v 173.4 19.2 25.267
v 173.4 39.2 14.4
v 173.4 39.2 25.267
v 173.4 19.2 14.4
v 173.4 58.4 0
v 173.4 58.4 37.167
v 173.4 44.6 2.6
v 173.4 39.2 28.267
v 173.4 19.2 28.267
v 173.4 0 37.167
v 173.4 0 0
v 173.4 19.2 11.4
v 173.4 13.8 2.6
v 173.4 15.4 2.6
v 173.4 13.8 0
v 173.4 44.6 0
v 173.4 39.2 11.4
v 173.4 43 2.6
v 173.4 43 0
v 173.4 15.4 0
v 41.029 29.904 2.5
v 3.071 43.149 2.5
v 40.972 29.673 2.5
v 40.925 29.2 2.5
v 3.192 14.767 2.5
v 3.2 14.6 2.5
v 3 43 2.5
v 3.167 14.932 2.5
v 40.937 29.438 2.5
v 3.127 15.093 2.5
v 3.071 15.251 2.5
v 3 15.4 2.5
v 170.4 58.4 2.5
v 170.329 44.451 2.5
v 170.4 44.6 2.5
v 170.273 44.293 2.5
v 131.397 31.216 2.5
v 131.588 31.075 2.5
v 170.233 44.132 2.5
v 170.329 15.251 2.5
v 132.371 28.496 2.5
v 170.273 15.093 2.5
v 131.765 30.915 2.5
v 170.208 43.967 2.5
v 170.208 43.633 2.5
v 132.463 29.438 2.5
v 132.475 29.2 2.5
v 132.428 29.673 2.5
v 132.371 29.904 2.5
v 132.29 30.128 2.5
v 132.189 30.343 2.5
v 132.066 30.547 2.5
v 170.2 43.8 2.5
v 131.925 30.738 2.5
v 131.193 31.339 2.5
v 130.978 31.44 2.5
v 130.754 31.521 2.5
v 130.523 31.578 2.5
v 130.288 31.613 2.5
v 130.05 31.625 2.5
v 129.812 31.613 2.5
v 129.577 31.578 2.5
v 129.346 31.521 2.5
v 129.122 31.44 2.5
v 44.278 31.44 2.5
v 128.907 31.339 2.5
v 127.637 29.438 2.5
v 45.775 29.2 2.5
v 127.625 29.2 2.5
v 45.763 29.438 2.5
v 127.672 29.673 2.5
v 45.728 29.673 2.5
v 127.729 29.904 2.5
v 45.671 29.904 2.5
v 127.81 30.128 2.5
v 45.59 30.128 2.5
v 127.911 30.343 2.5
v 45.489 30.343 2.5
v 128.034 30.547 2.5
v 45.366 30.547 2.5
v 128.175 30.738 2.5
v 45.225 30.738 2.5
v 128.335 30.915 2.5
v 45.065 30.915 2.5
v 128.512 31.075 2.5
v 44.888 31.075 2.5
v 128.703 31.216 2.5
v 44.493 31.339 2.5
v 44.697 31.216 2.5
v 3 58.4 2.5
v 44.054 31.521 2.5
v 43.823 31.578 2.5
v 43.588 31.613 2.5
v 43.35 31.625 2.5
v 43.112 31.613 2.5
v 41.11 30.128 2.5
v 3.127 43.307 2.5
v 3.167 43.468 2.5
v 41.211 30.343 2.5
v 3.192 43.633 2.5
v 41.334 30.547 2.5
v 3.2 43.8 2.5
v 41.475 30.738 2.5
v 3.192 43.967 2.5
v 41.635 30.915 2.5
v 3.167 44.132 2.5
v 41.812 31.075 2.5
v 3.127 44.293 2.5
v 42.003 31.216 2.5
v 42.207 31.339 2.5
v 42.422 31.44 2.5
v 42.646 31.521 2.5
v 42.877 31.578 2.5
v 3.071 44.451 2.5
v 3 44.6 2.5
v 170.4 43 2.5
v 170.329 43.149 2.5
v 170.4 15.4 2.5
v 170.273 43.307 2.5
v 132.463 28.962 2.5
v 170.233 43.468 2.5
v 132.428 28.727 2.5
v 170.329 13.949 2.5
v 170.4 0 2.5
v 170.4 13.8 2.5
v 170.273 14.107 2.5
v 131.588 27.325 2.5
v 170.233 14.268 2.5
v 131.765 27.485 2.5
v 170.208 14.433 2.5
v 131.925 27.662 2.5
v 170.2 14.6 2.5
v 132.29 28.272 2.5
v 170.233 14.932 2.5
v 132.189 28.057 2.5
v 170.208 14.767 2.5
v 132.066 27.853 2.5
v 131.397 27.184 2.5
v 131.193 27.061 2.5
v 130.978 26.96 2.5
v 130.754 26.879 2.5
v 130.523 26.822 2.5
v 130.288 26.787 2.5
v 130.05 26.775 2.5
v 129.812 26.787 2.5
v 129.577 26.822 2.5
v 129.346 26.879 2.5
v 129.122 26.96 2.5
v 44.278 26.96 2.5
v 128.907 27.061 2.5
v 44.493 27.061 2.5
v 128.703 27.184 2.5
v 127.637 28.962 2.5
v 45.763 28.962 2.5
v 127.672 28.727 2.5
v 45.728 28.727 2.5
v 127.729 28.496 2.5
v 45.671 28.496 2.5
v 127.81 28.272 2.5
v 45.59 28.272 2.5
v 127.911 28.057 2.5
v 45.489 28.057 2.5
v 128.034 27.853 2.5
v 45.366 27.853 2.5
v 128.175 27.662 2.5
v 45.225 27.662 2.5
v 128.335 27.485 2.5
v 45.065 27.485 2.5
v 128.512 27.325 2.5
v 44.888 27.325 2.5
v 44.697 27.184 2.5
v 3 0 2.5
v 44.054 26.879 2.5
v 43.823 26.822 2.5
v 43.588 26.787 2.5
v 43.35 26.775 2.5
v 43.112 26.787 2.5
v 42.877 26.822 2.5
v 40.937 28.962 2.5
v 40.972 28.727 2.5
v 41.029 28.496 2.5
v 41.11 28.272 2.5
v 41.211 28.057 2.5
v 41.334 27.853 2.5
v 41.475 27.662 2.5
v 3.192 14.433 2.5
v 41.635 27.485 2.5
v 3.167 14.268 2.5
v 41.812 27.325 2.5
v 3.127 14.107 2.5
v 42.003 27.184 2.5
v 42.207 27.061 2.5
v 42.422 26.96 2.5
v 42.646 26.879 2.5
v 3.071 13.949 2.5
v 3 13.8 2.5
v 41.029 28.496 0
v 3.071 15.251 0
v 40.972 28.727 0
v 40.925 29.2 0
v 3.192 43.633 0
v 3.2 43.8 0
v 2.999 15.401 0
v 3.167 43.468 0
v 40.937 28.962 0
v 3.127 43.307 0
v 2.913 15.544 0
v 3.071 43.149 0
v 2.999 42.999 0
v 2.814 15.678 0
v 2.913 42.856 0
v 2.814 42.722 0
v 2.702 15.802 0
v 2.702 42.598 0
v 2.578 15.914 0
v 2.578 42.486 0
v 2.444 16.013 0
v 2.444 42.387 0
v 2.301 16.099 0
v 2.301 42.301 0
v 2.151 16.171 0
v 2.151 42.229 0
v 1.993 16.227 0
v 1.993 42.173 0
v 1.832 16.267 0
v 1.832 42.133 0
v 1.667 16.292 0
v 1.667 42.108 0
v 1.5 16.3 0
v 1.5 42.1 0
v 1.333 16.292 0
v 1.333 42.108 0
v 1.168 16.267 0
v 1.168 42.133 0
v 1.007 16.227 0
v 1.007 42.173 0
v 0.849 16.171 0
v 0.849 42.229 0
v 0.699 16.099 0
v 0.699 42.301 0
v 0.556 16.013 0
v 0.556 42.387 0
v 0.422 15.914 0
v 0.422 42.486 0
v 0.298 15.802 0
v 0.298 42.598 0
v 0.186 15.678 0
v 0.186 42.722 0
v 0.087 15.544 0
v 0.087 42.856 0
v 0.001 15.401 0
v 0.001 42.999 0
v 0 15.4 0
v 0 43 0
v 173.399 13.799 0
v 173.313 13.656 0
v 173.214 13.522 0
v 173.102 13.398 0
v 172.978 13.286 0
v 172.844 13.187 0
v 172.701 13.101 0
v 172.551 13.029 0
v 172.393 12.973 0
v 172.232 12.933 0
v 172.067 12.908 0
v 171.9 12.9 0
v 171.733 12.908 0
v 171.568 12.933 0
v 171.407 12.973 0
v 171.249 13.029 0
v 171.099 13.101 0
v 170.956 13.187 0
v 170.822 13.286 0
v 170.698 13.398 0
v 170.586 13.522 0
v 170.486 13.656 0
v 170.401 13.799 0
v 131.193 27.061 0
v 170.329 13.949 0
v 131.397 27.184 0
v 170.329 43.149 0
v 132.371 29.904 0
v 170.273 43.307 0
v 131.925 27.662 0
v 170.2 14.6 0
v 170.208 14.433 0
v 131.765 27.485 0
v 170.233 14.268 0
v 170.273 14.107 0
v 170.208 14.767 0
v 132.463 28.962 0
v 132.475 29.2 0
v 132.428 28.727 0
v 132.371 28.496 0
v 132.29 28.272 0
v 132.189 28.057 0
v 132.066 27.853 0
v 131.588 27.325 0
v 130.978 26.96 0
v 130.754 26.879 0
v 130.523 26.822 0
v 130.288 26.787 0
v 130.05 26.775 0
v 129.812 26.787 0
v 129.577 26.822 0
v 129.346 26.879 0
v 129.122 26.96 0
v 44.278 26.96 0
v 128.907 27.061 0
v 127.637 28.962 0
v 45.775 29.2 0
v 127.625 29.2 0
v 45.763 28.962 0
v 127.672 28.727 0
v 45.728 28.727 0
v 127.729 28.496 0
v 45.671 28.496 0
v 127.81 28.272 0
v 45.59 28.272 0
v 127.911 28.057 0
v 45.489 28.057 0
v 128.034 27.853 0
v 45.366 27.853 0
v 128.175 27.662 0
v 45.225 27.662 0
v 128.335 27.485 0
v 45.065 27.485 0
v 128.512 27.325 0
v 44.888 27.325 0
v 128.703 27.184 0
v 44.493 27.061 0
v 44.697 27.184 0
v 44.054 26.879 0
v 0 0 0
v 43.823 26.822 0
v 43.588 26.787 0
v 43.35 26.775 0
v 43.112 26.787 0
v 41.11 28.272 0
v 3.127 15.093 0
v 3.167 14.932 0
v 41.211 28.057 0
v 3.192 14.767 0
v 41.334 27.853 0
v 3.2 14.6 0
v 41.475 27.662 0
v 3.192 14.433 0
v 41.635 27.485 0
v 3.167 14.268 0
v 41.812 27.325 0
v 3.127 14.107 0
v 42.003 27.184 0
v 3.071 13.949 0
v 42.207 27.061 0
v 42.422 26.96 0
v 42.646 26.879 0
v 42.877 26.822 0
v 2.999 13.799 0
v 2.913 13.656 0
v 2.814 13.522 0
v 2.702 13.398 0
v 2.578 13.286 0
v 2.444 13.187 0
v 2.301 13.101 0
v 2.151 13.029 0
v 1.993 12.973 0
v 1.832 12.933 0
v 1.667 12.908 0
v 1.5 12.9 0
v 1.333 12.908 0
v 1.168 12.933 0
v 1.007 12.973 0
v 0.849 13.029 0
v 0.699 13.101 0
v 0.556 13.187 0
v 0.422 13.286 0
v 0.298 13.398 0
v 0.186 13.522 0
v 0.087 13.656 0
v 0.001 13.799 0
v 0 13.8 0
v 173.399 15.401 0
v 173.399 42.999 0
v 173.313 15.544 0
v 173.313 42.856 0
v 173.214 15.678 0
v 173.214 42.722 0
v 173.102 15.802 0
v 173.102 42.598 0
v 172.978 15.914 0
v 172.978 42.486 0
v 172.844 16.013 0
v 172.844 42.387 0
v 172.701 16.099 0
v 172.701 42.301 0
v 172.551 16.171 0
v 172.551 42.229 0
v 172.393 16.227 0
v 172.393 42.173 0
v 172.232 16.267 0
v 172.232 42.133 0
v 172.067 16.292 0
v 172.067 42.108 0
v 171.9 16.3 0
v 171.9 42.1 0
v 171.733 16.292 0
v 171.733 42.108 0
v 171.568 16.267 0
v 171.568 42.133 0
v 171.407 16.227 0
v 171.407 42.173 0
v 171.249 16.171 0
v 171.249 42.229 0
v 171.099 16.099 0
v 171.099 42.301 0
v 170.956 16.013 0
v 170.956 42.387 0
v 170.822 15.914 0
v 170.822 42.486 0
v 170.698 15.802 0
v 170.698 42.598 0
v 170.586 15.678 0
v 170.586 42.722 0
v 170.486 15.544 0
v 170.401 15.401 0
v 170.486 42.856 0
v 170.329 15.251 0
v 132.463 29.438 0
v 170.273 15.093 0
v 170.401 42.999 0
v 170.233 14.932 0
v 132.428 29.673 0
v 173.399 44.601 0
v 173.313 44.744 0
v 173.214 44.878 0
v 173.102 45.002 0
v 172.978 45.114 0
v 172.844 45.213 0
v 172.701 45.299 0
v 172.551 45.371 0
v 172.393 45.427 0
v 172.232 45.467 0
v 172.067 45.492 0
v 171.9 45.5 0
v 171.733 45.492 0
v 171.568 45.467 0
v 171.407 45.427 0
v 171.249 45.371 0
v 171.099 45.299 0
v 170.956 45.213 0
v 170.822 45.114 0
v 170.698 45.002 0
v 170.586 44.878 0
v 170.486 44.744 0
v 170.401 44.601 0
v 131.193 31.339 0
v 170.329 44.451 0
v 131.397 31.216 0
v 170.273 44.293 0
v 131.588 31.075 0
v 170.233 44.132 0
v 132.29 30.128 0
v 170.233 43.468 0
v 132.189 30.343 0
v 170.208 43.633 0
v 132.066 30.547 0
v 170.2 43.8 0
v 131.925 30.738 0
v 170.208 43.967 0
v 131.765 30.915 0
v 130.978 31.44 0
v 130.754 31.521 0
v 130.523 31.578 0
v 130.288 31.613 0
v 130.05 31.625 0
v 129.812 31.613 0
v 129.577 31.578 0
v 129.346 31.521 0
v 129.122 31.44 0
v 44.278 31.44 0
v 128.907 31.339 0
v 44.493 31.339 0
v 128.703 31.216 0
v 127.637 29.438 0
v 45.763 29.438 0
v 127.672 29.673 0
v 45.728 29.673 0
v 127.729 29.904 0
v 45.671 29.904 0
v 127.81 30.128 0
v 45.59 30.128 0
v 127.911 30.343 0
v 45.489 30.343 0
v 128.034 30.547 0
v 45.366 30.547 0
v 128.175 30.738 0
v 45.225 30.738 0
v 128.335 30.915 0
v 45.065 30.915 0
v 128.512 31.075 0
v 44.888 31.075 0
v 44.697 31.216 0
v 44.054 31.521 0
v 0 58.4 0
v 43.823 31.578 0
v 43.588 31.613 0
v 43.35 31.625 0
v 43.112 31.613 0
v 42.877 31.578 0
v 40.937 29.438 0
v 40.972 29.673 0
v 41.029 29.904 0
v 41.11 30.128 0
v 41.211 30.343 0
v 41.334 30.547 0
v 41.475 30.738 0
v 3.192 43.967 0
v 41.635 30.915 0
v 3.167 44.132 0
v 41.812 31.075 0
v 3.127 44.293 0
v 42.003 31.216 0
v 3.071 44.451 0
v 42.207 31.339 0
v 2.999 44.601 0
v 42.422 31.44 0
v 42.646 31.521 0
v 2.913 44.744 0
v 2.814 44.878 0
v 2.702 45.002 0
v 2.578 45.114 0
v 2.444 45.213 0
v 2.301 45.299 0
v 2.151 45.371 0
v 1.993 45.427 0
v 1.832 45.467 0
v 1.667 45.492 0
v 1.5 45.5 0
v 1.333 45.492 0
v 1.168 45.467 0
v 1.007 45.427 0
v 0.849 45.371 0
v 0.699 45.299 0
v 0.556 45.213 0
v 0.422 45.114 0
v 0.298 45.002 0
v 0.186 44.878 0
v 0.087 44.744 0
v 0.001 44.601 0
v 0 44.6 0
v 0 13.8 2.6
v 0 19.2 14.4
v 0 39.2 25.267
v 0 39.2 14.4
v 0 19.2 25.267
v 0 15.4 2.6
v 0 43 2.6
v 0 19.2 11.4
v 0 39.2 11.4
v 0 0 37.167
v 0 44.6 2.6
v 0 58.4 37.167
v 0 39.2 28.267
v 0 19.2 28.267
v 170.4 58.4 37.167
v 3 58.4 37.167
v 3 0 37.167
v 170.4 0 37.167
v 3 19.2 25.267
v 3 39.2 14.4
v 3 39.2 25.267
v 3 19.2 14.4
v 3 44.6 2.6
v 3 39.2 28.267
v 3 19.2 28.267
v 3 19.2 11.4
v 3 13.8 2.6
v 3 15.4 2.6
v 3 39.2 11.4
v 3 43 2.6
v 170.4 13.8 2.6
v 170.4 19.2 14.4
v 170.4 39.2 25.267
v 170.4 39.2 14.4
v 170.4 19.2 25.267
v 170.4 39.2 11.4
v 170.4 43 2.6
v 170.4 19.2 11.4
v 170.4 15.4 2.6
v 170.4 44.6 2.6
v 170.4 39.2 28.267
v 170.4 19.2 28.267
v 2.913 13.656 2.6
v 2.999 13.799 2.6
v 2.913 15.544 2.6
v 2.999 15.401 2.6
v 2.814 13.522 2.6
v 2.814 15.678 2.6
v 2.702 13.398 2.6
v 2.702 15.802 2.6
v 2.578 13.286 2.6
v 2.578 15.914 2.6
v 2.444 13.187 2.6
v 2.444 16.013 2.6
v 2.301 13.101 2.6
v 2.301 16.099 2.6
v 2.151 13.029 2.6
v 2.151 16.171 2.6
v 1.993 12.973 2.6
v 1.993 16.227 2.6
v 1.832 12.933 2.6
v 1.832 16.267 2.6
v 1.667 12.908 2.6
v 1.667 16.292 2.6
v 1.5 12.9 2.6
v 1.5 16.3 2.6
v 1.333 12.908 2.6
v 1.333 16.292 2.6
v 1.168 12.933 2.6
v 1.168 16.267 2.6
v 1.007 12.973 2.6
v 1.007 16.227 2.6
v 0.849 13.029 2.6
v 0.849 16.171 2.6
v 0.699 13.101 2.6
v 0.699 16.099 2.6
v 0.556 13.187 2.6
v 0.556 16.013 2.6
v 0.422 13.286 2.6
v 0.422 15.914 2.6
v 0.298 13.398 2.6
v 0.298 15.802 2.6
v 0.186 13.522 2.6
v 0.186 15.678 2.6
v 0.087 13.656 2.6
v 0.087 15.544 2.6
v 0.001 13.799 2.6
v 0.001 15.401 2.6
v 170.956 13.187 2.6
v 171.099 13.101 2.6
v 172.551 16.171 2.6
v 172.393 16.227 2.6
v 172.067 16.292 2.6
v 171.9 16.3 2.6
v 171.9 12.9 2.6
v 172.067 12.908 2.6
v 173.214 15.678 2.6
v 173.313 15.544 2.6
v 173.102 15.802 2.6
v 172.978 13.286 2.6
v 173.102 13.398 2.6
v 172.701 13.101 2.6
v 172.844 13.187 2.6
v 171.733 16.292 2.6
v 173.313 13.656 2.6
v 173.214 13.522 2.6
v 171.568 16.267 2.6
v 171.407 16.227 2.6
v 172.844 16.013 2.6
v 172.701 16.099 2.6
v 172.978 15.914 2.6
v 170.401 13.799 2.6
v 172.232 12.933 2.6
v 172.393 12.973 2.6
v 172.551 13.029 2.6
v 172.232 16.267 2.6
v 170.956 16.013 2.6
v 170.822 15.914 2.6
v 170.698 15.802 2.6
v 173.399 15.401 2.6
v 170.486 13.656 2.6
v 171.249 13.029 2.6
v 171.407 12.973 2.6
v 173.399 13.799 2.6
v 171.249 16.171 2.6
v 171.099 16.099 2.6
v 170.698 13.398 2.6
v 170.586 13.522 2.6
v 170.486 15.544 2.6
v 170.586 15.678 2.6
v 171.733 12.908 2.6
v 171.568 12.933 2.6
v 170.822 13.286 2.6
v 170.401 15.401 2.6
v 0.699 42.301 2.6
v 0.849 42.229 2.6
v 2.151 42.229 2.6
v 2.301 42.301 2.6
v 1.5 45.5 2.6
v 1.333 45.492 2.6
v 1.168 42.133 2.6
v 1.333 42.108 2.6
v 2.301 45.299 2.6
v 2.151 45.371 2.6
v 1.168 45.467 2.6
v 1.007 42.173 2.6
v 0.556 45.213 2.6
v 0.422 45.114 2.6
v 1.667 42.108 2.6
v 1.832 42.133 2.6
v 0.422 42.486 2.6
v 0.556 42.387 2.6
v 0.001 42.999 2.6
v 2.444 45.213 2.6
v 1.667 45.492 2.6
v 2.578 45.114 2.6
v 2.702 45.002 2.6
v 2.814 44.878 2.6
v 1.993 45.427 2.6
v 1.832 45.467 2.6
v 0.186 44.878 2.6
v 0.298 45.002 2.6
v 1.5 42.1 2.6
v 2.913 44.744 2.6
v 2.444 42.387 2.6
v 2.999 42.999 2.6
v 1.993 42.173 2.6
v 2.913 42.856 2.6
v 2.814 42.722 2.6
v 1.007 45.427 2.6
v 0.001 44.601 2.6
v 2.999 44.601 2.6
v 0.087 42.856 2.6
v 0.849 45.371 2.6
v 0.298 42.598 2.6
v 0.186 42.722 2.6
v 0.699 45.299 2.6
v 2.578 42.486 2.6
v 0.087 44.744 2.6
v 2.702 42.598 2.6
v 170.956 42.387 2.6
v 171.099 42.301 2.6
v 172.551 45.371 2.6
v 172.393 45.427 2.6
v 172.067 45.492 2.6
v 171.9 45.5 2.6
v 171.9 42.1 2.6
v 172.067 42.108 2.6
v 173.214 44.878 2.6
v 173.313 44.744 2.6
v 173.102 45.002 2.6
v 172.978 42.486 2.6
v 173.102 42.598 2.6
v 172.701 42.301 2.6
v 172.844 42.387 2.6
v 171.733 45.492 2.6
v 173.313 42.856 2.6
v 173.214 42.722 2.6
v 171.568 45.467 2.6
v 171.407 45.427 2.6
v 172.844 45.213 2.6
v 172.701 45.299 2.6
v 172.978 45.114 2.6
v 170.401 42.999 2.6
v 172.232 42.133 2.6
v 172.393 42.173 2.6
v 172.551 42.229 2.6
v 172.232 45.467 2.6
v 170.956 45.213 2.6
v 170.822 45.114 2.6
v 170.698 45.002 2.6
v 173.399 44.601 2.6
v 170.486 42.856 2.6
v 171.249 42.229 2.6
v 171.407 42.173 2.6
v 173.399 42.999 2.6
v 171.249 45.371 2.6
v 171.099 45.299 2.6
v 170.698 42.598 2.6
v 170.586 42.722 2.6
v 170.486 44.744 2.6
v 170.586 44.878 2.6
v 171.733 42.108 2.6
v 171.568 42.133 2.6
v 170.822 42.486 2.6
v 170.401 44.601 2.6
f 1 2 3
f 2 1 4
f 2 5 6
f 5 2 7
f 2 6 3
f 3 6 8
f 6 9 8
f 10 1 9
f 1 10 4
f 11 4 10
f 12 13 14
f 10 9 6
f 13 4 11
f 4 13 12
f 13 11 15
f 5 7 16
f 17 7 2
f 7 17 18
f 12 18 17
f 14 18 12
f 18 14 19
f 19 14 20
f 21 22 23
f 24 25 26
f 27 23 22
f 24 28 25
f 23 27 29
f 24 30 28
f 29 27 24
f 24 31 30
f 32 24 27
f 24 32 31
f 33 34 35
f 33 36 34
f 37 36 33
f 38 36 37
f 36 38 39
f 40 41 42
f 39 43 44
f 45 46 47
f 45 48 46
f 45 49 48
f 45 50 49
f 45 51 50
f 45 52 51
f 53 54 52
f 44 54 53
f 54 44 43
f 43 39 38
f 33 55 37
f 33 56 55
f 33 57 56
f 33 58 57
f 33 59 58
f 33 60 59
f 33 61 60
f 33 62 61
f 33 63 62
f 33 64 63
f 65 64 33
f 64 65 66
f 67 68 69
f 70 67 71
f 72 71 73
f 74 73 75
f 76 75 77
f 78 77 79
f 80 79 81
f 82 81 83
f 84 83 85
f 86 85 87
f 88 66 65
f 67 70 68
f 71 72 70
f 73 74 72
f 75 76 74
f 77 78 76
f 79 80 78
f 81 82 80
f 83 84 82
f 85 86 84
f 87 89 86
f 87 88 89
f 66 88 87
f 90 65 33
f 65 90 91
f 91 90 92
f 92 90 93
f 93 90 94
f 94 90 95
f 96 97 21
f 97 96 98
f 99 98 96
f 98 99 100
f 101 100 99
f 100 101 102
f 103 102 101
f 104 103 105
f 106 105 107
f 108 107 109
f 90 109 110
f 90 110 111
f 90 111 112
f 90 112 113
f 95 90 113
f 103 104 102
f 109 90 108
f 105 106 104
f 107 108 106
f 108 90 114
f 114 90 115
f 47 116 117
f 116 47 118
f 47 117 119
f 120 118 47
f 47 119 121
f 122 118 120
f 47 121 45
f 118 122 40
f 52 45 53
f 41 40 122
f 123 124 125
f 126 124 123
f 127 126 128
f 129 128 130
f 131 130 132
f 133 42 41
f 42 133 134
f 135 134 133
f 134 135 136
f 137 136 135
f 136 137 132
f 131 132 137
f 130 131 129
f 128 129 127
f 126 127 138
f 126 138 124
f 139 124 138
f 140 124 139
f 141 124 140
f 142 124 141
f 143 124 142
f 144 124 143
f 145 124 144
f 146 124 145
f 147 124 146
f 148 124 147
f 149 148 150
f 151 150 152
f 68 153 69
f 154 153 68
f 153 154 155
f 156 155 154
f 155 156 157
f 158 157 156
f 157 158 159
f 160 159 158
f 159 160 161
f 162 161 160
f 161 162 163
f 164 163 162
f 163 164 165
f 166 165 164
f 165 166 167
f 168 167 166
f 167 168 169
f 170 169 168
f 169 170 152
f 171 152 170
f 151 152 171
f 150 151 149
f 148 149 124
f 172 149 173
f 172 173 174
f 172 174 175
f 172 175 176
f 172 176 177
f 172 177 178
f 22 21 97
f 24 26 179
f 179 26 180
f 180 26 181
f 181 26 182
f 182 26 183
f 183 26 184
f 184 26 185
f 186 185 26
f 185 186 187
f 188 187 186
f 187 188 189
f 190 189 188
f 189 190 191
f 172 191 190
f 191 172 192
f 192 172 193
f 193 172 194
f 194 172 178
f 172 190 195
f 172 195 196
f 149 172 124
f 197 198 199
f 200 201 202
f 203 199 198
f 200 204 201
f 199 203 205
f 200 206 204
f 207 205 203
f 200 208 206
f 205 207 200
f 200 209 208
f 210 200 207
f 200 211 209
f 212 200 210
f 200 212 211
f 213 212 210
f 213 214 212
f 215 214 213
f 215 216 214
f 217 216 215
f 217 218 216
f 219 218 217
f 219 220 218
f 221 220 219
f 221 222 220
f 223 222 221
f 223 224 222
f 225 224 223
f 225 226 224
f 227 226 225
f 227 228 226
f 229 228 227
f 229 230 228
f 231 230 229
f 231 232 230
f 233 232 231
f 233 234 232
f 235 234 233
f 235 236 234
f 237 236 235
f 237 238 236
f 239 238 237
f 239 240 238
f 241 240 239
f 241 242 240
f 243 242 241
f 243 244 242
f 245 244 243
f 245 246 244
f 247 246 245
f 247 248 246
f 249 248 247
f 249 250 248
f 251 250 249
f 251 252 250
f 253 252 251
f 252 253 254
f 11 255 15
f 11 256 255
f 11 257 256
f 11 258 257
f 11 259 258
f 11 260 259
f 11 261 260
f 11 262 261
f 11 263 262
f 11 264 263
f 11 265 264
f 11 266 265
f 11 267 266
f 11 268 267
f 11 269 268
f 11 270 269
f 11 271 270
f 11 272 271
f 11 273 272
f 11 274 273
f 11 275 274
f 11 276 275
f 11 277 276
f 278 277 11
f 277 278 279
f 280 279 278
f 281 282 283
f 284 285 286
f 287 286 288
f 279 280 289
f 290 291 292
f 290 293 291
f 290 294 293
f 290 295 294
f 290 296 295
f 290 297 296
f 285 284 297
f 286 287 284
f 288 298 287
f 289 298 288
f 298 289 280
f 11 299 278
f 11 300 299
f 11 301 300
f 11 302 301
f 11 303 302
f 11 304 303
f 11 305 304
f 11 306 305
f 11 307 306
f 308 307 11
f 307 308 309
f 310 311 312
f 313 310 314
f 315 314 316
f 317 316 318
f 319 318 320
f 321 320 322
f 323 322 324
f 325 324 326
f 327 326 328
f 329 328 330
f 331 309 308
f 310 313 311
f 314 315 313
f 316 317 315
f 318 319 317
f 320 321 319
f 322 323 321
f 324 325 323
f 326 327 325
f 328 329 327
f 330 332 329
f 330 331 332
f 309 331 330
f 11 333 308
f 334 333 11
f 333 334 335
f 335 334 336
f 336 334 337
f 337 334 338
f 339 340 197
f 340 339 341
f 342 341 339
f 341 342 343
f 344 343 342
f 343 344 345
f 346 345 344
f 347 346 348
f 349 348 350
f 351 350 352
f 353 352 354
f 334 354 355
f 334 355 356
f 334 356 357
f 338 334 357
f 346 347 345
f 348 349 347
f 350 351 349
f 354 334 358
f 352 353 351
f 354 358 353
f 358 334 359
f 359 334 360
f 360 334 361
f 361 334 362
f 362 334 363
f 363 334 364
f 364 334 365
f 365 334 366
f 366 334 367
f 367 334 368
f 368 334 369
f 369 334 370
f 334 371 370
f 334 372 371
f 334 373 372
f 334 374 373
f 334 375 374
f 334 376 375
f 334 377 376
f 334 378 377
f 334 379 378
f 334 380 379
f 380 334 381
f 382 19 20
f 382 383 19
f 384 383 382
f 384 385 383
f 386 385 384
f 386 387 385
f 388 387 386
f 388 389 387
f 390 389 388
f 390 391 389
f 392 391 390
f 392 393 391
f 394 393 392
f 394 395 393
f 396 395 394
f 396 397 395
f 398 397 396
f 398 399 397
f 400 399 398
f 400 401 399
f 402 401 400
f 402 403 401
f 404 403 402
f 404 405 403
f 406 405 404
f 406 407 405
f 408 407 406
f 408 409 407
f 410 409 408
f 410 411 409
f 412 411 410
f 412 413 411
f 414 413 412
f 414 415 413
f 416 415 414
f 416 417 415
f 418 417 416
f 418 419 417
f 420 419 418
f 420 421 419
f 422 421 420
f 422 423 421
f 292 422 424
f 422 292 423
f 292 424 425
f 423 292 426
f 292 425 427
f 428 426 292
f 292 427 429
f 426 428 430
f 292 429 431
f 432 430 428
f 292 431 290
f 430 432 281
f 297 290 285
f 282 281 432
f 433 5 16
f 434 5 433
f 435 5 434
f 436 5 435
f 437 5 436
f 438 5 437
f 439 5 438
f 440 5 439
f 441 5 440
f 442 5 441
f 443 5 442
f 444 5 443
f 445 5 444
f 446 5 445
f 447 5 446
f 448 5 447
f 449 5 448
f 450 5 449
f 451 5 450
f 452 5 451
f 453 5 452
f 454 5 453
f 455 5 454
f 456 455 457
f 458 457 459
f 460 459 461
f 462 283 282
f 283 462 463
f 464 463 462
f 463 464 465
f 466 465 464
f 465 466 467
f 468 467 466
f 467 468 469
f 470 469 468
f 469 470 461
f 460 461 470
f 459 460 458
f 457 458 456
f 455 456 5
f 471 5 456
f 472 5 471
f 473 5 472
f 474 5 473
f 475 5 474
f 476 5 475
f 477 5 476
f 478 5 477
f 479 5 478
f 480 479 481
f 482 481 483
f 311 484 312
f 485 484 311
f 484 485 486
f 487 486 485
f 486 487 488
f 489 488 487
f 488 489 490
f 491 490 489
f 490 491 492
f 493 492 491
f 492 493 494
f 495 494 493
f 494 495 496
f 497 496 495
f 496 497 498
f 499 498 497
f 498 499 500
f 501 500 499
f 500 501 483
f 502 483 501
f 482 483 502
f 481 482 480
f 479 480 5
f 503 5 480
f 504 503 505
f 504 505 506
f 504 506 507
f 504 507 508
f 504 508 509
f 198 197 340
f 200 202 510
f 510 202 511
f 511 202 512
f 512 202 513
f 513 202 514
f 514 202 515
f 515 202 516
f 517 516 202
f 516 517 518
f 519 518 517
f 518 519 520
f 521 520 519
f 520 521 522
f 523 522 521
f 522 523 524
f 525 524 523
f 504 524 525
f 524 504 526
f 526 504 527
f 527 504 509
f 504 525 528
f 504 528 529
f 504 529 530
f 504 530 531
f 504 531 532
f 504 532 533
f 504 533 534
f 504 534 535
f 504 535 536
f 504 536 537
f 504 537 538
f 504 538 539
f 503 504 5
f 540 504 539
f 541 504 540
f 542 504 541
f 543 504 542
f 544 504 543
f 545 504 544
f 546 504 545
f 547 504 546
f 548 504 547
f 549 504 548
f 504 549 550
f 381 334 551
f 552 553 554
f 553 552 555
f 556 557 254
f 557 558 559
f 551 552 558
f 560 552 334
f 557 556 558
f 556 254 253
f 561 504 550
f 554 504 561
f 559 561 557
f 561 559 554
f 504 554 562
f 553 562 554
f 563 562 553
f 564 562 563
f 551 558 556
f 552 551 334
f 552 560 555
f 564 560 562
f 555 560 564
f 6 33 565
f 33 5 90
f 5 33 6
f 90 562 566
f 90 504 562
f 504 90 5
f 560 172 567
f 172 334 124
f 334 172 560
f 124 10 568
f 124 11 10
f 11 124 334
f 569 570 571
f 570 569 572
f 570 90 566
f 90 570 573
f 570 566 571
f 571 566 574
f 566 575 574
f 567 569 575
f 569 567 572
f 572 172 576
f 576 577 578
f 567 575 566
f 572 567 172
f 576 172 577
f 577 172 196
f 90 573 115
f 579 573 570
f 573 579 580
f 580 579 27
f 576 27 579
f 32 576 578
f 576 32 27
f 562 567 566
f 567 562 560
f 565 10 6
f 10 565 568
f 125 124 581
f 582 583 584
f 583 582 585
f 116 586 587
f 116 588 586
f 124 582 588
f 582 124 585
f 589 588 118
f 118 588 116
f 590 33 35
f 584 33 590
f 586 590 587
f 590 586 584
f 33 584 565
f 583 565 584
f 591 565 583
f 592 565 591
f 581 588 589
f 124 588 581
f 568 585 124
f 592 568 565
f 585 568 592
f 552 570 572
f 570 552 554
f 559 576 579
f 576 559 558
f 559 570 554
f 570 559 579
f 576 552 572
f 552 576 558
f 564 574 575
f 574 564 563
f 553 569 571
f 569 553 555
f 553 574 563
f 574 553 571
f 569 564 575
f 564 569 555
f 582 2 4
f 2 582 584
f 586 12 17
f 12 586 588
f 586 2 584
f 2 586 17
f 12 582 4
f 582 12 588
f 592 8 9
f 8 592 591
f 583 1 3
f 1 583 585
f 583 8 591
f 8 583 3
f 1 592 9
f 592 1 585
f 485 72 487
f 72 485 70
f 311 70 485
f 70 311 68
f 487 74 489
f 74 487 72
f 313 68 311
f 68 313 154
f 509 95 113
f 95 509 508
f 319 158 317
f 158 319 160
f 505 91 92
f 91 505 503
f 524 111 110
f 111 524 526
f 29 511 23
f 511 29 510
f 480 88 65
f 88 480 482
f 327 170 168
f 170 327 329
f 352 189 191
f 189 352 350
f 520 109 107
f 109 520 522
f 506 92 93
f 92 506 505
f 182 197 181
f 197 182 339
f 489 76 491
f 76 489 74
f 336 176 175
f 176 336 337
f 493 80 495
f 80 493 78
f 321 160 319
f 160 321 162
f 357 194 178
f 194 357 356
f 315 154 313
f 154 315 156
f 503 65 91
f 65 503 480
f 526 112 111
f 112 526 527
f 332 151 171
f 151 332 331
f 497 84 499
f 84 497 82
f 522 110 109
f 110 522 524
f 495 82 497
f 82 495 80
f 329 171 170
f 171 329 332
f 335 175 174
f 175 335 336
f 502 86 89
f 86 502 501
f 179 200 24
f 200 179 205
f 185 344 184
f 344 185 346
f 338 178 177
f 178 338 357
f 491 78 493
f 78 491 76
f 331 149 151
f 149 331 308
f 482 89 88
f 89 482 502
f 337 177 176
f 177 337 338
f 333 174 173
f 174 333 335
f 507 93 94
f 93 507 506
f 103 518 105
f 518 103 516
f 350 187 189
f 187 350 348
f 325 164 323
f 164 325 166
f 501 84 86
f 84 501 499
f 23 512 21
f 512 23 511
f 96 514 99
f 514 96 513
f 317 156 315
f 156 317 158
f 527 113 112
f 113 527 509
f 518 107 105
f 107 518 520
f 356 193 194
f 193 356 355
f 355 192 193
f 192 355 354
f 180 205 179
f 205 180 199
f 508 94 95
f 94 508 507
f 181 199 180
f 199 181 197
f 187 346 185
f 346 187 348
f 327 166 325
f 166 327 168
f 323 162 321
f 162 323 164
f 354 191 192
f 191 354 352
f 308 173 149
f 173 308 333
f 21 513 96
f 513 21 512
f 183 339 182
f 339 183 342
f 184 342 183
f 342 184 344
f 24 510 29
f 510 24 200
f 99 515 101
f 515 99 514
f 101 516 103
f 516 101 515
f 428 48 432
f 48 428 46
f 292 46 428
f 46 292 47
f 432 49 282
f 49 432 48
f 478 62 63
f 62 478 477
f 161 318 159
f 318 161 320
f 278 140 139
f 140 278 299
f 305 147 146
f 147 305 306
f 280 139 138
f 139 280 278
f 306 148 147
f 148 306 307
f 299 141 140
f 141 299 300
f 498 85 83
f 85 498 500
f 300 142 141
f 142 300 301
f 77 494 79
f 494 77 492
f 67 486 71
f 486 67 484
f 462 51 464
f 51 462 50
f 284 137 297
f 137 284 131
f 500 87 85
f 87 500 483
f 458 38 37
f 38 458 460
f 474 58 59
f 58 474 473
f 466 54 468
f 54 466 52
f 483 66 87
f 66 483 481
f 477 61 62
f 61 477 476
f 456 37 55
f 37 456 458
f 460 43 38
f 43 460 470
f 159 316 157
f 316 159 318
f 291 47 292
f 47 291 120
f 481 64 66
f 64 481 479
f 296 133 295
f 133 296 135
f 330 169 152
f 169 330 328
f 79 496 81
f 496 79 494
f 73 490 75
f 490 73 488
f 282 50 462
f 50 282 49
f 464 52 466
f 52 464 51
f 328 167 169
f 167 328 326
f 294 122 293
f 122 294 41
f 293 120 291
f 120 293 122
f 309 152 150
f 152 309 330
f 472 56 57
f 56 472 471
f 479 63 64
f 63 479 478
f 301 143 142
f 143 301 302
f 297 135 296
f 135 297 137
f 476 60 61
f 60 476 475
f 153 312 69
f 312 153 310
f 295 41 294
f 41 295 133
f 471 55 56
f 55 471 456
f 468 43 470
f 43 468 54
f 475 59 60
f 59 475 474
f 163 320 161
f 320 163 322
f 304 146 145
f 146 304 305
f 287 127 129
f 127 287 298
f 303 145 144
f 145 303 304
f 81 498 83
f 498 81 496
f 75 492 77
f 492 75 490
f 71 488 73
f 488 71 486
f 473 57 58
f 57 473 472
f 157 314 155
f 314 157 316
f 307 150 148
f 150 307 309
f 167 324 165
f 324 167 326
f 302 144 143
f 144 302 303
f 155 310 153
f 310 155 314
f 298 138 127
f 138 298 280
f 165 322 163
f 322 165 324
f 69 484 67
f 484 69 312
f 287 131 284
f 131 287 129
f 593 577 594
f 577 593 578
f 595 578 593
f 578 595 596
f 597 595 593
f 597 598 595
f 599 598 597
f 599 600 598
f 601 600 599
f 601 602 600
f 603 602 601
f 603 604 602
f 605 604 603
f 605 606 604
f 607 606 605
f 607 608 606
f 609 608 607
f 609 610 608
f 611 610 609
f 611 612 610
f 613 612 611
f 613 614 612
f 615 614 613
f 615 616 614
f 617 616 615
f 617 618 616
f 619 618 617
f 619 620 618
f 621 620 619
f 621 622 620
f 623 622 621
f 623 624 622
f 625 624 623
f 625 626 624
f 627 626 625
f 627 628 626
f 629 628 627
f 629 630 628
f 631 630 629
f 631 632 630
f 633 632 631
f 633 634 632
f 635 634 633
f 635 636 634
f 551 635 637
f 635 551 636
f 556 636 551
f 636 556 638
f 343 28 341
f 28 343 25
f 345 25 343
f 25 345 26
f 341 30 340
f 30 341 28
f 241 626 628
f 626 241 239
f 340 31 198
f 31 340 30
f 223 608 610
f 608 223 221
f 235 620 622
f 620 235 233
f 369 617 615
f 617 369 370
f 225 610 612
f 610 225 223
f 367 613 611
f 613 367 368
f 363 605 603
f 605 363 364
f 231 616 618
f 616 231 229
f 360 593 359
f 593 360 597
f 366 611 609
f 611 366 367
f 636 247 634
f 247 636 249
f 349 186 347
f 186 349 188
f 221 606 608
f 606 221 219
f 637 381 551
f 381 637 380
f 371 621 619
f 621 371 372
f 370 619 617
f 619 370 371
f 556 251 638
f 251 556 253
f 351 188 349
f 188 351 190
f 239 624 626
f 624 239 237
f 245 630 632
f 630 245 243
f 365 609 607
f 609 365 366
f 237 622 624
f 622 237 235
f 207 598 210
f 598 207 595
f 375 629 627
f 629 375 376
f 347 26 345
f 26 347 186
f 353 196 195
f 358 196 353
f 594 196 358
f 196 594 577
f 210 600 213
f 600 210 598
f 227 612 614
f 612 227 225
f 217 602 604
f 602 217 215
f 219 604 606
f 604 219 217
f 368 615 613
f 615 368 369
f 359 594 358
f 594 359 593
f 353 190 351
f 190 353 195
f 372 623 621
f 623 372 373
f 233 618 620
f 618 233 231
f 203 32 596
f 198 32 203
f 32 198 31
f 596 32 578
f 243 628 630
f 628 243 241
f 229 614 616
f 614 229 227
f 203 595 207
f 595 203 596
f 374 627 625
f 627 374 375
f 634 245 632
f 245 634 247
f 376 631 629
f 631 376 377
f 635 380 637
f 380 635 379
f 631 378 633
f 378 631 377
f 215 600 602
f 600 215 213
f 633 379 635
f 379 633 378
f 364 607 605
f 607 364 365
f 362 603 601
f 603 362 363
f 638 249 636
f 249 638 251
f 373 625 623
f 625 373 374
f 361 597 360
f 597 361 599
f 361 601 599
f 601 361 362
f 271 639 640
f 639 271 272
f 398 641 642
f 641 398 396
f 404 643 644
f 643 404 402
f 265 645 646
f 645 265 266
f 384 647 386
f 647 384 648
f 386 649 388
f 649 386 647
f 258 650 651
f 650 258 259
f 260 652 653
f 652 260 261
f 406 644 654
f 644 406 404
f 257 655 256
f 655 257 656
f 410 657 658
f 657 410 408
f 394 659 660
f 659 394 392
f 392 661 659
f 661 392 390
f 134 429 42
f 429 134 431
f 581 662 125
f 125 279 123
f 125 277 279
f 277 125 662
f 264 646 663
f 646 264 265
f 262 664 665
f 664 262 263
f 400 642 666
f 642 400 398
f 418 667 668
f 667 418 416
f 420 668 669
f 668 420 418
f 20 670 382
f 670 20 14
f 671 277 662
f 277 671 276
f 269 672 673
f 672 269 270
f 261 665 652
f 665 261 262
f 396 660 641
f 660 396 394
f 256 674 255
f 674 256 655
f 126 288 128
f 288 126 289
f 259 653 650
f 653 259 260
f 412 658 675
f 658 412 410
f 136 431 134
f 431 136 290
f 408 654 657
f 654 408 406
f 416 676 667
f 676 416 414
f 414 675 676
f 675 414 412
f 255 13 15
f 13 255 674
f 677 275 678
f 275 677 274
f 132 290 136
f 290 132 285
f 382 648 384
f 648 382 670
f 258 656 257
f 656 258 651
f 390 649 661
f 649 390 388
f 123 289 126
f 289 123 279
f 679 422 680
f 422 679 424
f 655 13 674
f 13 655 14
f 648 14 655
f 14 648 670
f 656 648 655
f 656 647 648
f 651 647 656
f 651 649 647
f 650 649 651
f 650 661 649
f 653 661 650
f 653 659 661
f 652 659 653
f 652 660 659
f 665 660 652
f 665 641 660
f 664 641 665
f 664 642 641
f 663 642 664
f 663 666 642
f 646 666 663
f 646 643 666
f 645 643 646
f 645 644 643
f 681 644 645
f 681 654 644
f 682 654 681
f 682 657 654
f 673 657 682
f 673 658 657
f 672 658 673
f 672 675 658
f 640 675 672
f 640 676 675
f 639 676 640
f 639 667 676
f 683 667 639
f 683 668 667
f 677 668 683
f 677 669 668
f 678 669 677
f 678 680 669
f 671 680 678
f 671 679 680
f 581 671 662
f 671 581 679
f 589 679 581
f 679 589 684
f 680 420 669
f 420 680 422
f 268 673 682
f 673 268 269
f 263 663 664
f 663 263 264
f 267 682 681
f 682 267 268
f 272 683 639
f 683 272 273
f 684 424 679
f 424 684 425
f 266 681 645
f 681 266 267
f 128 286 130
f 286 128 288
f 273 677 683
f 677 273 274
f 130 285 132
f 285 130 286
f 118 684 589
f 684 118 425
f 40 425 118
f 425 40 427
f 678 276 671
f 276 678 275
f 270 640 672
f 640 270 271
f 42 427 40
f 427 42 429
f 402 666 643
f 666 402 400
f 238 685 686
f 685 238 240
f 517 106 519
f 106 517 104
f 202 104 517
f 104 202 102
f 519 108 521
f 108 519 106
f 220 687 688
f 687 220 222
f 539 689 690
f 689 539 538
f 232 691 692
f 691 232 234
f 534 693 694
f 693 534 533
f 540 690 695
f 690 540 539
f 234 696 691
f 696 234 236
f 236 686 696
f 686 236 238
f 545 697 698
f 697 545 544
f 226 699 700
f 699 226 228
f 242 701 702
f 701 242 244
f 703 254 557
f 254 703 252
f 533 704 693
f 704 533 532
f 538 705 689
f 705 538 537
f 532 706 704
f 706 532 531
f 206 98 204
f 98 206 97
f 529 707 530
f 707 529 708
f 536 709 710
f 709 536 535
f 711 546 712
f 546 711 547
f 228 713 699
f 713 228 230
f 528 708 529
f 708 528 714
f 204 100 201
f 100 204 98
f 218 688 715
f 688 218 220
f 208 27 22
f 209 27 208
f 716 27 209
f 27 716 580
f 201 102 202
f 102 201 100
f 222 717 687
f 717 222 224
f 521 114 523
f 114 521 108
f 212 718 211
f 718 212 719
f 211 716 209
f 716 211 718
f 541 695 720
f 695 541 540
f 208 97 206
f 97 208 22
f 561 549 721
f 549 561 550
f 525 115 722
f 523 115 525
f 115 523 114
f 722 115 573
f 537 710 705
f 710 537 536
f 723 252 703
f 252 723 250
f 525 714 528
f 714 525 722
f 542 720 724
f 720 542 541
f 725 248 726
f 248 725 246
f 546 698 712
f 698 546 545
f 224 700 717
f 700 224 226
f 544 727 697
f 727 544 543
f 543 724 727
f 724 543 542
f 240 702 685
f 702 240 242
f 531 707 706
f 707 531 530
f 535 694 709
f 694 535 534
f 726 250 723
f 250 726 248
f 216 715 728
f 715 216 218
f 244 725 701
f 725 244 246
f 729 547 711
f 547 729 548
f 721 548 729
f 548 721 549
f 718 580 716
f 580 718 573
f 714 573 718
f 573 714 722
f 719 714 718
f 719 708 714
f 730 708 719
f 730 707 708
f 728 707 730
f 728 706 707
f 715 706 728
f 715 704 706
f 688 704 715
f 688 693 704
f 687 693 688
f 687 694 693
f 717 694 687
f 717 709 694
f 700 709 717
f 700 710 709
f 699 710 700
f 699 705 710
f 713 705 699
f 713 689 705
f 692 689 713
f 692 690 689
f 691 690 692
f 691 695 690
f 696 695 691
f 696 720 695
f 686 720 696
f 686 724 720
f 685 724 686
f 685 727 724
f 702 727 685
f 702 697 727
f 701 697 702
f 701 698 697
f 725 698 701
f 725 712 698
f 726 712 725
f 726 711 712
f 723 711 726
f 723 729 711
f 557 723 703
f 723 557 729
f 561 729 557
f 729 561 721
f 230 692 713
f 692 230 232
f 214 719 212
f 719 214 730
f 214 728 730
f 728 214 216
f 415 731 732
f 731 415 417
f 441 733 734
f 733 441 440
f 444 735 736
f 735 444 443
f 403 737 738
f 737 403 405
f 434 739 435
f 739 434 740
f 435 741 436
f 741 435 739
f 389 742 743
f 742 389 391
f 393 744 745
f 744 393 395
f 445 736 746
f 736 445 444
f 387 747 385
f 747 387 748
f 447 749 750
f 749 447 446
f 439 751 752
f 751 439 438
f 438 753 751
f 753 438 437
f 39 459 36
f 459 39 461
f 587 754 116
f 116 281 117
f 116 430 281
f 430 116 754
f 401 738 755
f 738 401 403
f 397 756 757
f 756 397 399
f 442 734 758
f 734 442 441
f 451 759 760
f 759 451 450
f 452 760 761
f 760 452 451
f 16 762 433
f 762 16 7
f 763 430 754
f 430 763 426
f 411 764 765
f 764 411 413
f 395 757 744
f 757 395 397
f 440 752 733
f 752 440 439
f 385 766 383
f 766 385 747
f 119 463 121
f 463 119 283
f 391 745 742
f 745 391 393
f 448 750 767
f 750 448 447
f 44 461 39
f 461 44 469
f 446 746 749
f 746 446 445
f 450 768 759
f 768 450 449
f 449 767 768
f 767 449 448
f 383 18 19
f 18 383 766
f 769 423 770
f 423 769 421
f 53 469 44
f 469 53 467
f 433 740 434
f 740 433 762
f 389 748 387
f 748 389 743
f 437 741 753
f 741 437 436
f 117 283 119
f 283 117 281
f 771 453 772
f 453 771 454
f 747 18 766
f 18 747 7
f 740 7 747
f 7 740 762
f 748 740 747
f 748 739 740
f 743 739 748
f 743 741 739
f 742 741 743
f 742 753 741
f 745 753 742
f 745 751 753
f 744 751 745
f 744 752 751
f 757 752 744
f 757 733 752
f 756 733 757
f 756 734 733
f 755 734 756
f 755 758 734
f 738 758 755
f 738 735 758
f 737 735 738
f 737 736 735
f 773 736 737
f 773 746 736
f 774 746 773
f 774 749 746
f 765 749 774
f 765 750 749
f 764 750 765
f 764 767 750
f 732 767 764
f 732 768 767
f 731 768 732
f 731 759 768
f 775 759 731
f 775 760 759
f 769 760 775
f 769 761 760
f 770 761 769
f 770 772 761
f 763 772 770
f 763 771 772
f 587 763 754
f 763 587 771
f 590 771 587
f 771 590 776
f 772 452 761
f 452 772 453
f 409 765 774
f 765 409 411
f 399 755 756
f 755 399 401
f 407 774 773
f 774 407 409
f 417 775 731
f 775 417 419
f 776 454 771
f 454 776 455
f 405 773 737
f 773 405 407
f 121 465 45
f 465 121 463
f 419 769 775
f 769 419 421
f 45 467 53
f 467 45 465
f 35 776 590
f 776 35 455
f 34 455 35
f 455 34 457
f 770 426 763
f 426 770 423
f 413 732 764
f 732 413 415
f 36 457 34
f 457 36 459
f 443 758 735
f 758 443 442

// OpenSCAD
// file: config.scad
// ─────────────────────────────────────────────────────────────────────────────
//  config.scad  –  Global parameters for modular open-frame desktop
//                  mini-server rack
//
//  Rack outer envelope : 250 × 260 × 285 mm  (W × D × H)
//  Fastener standard   : M3 heat-set inserts + M3 cap-head screws
//  Print target        : Bambu H2D (350 × 320 mm bed)
// ─────────────────────────────────────────────────────────────────────────────

// ── Rack outer envelope ───────────────────────────────────────────────────────
RACK_W = 250;    // overall width   (X) mm
RACK_D = 260;    // overall depth   (Y) mm
RACK_H = 285;    // overall height  (Z) mm

// ── Side rail cross-section ───────────────────────────────────────────────────
RAIL_W = 20;     // rail thickness  (X) mm
RAIL_D = RACK_D; // rail runs full depth
RAIL_H = RACK_H; // rail runs full height

// Usable inner width between the two rails
INNER_W = RACK_W - 2 * RAIL_W;   // 210 mm

// Pitch (mm) between mounting-insert rows along rail height
SLOT_PITCH = 20;

// ── Crossbar ─────────────────────────────────────────────────────────────────
CBAR_W = RACK_W;  // full rack width  (X)
CBAR_D = 25;      // front-to-back depth (Y)
CBAR_H = 8;       // thickness (Z)

// Y offsets of the two mounting screws per crossbar end
// (measured from the crossbar's own front face)
CBAR_MOUNT_Y1 = CBAR_D * 0.30;   // ≈ 7.5 mm
CBAR_MOUNT_Y2 = CBAR_D * 0.70;   // ≈ 17.5 mm

// ── Device dimensions  W × D × H  (all in mm) ────────────────────────────────
MM2_W = 196.85;  MM2_D = 196.85;  MM2_H = 35.8;   // Mac mini M2
MM4_W = 127.0;   MM4_D = 127.0;   MM4_H = 50.0;   // Mac mini M4
PI5_W = 85.0;    PI5_D = 56.0;    PI5_H = 17.0;   // Raspberry Pi 5 PCB
ATV_W = 93.0;    ATV_D = 93.0;    ATV_H = 31.0;   // Apple TV 4K 3rd gen
FX_W  = 167.0;   FX_D  = 104.0;   FX_H  = 52.0;   // Inseego FX4100

// ── Raspberry Pi 5 mounting-hole grid (from board origin corner) ──────────────
PI5_HOLE_X1 = 3.5;
PI5_HOLE_X2 = 61.5;
PI5_HOLE_Y1 = 3.5;
PI5_HOLE_Y2 = 52.5;
PI5_STANDOFF_H  = 5.0;   // height of standoff posts above plate floor
PI5_STANDOFF_OD = 6.0;   // standoff outer diameter
PI5_HOLE_D      = 2.7;   // M2.5 clearance hole through standoff

// ── Fasteners – M3 heat-set inserts + M3 screws ───────────────────────────────
M3_INSERT_D = 4.7;   // insert outer Ø  (press-fit into 4.5 mm hole → +0.2 entry)
M3_INSERT_H = 5.7;   // insert depth
M3_CLEAR_D  = 3.4;   // M3 clearance hole Ø
M3_HEAD_D   = 6.0;   // M3 cap-head Ø
M3_HEAD_H   = 3.0;   // M3 cap-head height
M3_CBORE_D  = 6.5;   // counterbore Ø (seat for cap head)

// ── Print / geometry ──────────────────────────────────────────────────────────
WALL      = 3.0;   // shell wall thickness
FLOOR     = 2.5;   // tray / plate floor thickness
LIP_H     = 6.0;   // front retention-lip height above device top
CLEARANCE = 0.2;   // per-side fit clearance (0.4 mm total)

// ── Vent slots ────────────────────────────────────────────────────────────────
VENT_W     = 3.0;    // slot width
VENT_L     = 20.0;   // slot length (along its own long axis)
VENT_PITCH = 6.0;    // centre-to-centre pitch between slots

// ── Cable-relief slots in rear tray wall ─────────────────────────────────────
CABLE_SLOT_W = 8.0;
CABLE_SLOT_H = 20.0;  // height of opening in rear wall

// ── Anti-vibration feet ───────────────────────────────────────────────────────
FOOT_OD       = 25;   // outer Ø
FOOT_H        = 10;   // total height
FOOT_RUBBER_D = 20;   // rubber-pad recess Ø
FOOT_RUBBER_H = 3;    // rubber-pad recess depth

// ── Strap slot for FX4100 cradle ─────────────────────────────────────────────
STRAP_W = 20;    // strap width
STRAP_H =  3;    // strap slot thickness (clearance)

// ── Render quality ────────────────────────────────────────────────────────────
$fn = 64;
// main file
// ─────────────────────────────────────────────────────────────────────────────
//  cradle_fx4100.scad  –  Vertical open-sided strap-retained cradle for
//                          Inseego FX4100 mobile hotspot
//
//  Device envelope (lying flat on wide face): 167 × 104 × 52 mm  (W × D × H)
//  Mounted vertically: device stands on its 167 × 52 mm base, tallest
//  dimension (104 mm) pointing upward.
//
//  Cradle architecture
//    • Bottom platform (FLOOR thick, device stands on it)
//    • Left and right side walls (WALL thick, open front and rear for airflow)
//    • Two strap-routing slots on each side wall to accept a hook-and-loop strap
//    • Two M3 heat-set insert pockets in the base for optional screw retention
//    • M3 clearance holes in base flanges for mounting to a crossbar
// ─────────────────────────────────────────────────────────────────────────────
include <config.scad>

// ── Cradle-specific geometry ──────────────────────────────────────────────────
// Device stands upright: footprint is FX_W × FX_H, wall height ≥ FX_D / 3
_dev_fw  = FX_W + 2 * CLEARANCE;   // 167.4 mm  – device footprint width (X)
_dev_fd  = FX_H + 2 * CLEARANCE;   // 52.4  mm  – device footprint depth (Y)
_wall_h  = max(FX_D / 3, 30);      // side-wall height (~34.7 mm) – keeps device
                                    // stable while remaining open-sided

_outer_w = _dev_fw + 2 * WALL;     // cradle outer width
_outer_d = _dev_fd + 2 * WALL;     // cradle outer depth

// Strap slots: two per side wall, centred in X on the wall, stacked in Z
_strap_z1 = _wall_h * 0.30;
_strap_z2 = _wall_h * 0.70;

// M3 insert pocket helper (opens toward +Z)
module _insert_pocket_z() {
    cylinder(d = M3_INSERT_D + 0.15, h = M3_INSERT_H + 0.5);
}

module cradle_fx4100() {
    difference() {
        union() {
            // ── Bottom platform ───────────────────────────────────────────────
            cube([_outer_w, _outer_d, FLOOR]);

            // ── Left side wall (−X face of device pocket) ────────────────────
            translate([0, 0, 0])
                cube([WALL, _outer_d, FLOOR + _wall_h]);

            // ── Right side wall (+X face of device pocket) ───────────────────
            translate([WALL + _dev_fw, 0, 0])
                cube([WALL, _outer_d, FLOOR + _wall_h]);
        }

        // ── Strap slots in left wall ──────────────────────────────────────────
        for (sz = [_strap_z1, _strap_z2]) {
            translate([-0.1, (_outer_d - STRAP_W) / 2, FLOOR + sz - STRAP_H / 2])
                cube([WALL + 0.2, STRAP_W, STRAP_H]);
        }

        // ── Strap slots in right wall ─────────────────────────────────────────
        for (sz = [_strap_z1, _strap_z2]) {
            translate([WALL + _dev_fw - 0.1,
                       (_outer_d - STRAP_W) / 2,
                       FLOOR + sz - STRAP_H / 2])
                cube([WALL + 0.2, STRAP_W, STRAP_H]);
        }

        // ── M3 heat-set insert pockets in base (optional screw retention) ─────
        for (ix = [_outer_w * 0.25, _outer_w * 0.75]) {
            translate([ix, _outer_d / 2, -0.1])
                _insert_pocket_z();
        }

        // ── M3 clearance holes in base flanges for crossbar mounting ──────────
        for (fy = [_outer_d * 0.25, _outer_d * 0.75]) {
            // left flange
            translate([WALL / 2, fy, -0.1])
                cylinder(d = M3_CLEAR_D, h = FLOOR + 0.2);
            // right flange
            translate([_outer_w - WALL / 2, fy, -0.1])
                cylinder(d = M3_CLEAR_D, h = FLOOR + 0.2);
        }
    }
}

cradle_fx4100();
